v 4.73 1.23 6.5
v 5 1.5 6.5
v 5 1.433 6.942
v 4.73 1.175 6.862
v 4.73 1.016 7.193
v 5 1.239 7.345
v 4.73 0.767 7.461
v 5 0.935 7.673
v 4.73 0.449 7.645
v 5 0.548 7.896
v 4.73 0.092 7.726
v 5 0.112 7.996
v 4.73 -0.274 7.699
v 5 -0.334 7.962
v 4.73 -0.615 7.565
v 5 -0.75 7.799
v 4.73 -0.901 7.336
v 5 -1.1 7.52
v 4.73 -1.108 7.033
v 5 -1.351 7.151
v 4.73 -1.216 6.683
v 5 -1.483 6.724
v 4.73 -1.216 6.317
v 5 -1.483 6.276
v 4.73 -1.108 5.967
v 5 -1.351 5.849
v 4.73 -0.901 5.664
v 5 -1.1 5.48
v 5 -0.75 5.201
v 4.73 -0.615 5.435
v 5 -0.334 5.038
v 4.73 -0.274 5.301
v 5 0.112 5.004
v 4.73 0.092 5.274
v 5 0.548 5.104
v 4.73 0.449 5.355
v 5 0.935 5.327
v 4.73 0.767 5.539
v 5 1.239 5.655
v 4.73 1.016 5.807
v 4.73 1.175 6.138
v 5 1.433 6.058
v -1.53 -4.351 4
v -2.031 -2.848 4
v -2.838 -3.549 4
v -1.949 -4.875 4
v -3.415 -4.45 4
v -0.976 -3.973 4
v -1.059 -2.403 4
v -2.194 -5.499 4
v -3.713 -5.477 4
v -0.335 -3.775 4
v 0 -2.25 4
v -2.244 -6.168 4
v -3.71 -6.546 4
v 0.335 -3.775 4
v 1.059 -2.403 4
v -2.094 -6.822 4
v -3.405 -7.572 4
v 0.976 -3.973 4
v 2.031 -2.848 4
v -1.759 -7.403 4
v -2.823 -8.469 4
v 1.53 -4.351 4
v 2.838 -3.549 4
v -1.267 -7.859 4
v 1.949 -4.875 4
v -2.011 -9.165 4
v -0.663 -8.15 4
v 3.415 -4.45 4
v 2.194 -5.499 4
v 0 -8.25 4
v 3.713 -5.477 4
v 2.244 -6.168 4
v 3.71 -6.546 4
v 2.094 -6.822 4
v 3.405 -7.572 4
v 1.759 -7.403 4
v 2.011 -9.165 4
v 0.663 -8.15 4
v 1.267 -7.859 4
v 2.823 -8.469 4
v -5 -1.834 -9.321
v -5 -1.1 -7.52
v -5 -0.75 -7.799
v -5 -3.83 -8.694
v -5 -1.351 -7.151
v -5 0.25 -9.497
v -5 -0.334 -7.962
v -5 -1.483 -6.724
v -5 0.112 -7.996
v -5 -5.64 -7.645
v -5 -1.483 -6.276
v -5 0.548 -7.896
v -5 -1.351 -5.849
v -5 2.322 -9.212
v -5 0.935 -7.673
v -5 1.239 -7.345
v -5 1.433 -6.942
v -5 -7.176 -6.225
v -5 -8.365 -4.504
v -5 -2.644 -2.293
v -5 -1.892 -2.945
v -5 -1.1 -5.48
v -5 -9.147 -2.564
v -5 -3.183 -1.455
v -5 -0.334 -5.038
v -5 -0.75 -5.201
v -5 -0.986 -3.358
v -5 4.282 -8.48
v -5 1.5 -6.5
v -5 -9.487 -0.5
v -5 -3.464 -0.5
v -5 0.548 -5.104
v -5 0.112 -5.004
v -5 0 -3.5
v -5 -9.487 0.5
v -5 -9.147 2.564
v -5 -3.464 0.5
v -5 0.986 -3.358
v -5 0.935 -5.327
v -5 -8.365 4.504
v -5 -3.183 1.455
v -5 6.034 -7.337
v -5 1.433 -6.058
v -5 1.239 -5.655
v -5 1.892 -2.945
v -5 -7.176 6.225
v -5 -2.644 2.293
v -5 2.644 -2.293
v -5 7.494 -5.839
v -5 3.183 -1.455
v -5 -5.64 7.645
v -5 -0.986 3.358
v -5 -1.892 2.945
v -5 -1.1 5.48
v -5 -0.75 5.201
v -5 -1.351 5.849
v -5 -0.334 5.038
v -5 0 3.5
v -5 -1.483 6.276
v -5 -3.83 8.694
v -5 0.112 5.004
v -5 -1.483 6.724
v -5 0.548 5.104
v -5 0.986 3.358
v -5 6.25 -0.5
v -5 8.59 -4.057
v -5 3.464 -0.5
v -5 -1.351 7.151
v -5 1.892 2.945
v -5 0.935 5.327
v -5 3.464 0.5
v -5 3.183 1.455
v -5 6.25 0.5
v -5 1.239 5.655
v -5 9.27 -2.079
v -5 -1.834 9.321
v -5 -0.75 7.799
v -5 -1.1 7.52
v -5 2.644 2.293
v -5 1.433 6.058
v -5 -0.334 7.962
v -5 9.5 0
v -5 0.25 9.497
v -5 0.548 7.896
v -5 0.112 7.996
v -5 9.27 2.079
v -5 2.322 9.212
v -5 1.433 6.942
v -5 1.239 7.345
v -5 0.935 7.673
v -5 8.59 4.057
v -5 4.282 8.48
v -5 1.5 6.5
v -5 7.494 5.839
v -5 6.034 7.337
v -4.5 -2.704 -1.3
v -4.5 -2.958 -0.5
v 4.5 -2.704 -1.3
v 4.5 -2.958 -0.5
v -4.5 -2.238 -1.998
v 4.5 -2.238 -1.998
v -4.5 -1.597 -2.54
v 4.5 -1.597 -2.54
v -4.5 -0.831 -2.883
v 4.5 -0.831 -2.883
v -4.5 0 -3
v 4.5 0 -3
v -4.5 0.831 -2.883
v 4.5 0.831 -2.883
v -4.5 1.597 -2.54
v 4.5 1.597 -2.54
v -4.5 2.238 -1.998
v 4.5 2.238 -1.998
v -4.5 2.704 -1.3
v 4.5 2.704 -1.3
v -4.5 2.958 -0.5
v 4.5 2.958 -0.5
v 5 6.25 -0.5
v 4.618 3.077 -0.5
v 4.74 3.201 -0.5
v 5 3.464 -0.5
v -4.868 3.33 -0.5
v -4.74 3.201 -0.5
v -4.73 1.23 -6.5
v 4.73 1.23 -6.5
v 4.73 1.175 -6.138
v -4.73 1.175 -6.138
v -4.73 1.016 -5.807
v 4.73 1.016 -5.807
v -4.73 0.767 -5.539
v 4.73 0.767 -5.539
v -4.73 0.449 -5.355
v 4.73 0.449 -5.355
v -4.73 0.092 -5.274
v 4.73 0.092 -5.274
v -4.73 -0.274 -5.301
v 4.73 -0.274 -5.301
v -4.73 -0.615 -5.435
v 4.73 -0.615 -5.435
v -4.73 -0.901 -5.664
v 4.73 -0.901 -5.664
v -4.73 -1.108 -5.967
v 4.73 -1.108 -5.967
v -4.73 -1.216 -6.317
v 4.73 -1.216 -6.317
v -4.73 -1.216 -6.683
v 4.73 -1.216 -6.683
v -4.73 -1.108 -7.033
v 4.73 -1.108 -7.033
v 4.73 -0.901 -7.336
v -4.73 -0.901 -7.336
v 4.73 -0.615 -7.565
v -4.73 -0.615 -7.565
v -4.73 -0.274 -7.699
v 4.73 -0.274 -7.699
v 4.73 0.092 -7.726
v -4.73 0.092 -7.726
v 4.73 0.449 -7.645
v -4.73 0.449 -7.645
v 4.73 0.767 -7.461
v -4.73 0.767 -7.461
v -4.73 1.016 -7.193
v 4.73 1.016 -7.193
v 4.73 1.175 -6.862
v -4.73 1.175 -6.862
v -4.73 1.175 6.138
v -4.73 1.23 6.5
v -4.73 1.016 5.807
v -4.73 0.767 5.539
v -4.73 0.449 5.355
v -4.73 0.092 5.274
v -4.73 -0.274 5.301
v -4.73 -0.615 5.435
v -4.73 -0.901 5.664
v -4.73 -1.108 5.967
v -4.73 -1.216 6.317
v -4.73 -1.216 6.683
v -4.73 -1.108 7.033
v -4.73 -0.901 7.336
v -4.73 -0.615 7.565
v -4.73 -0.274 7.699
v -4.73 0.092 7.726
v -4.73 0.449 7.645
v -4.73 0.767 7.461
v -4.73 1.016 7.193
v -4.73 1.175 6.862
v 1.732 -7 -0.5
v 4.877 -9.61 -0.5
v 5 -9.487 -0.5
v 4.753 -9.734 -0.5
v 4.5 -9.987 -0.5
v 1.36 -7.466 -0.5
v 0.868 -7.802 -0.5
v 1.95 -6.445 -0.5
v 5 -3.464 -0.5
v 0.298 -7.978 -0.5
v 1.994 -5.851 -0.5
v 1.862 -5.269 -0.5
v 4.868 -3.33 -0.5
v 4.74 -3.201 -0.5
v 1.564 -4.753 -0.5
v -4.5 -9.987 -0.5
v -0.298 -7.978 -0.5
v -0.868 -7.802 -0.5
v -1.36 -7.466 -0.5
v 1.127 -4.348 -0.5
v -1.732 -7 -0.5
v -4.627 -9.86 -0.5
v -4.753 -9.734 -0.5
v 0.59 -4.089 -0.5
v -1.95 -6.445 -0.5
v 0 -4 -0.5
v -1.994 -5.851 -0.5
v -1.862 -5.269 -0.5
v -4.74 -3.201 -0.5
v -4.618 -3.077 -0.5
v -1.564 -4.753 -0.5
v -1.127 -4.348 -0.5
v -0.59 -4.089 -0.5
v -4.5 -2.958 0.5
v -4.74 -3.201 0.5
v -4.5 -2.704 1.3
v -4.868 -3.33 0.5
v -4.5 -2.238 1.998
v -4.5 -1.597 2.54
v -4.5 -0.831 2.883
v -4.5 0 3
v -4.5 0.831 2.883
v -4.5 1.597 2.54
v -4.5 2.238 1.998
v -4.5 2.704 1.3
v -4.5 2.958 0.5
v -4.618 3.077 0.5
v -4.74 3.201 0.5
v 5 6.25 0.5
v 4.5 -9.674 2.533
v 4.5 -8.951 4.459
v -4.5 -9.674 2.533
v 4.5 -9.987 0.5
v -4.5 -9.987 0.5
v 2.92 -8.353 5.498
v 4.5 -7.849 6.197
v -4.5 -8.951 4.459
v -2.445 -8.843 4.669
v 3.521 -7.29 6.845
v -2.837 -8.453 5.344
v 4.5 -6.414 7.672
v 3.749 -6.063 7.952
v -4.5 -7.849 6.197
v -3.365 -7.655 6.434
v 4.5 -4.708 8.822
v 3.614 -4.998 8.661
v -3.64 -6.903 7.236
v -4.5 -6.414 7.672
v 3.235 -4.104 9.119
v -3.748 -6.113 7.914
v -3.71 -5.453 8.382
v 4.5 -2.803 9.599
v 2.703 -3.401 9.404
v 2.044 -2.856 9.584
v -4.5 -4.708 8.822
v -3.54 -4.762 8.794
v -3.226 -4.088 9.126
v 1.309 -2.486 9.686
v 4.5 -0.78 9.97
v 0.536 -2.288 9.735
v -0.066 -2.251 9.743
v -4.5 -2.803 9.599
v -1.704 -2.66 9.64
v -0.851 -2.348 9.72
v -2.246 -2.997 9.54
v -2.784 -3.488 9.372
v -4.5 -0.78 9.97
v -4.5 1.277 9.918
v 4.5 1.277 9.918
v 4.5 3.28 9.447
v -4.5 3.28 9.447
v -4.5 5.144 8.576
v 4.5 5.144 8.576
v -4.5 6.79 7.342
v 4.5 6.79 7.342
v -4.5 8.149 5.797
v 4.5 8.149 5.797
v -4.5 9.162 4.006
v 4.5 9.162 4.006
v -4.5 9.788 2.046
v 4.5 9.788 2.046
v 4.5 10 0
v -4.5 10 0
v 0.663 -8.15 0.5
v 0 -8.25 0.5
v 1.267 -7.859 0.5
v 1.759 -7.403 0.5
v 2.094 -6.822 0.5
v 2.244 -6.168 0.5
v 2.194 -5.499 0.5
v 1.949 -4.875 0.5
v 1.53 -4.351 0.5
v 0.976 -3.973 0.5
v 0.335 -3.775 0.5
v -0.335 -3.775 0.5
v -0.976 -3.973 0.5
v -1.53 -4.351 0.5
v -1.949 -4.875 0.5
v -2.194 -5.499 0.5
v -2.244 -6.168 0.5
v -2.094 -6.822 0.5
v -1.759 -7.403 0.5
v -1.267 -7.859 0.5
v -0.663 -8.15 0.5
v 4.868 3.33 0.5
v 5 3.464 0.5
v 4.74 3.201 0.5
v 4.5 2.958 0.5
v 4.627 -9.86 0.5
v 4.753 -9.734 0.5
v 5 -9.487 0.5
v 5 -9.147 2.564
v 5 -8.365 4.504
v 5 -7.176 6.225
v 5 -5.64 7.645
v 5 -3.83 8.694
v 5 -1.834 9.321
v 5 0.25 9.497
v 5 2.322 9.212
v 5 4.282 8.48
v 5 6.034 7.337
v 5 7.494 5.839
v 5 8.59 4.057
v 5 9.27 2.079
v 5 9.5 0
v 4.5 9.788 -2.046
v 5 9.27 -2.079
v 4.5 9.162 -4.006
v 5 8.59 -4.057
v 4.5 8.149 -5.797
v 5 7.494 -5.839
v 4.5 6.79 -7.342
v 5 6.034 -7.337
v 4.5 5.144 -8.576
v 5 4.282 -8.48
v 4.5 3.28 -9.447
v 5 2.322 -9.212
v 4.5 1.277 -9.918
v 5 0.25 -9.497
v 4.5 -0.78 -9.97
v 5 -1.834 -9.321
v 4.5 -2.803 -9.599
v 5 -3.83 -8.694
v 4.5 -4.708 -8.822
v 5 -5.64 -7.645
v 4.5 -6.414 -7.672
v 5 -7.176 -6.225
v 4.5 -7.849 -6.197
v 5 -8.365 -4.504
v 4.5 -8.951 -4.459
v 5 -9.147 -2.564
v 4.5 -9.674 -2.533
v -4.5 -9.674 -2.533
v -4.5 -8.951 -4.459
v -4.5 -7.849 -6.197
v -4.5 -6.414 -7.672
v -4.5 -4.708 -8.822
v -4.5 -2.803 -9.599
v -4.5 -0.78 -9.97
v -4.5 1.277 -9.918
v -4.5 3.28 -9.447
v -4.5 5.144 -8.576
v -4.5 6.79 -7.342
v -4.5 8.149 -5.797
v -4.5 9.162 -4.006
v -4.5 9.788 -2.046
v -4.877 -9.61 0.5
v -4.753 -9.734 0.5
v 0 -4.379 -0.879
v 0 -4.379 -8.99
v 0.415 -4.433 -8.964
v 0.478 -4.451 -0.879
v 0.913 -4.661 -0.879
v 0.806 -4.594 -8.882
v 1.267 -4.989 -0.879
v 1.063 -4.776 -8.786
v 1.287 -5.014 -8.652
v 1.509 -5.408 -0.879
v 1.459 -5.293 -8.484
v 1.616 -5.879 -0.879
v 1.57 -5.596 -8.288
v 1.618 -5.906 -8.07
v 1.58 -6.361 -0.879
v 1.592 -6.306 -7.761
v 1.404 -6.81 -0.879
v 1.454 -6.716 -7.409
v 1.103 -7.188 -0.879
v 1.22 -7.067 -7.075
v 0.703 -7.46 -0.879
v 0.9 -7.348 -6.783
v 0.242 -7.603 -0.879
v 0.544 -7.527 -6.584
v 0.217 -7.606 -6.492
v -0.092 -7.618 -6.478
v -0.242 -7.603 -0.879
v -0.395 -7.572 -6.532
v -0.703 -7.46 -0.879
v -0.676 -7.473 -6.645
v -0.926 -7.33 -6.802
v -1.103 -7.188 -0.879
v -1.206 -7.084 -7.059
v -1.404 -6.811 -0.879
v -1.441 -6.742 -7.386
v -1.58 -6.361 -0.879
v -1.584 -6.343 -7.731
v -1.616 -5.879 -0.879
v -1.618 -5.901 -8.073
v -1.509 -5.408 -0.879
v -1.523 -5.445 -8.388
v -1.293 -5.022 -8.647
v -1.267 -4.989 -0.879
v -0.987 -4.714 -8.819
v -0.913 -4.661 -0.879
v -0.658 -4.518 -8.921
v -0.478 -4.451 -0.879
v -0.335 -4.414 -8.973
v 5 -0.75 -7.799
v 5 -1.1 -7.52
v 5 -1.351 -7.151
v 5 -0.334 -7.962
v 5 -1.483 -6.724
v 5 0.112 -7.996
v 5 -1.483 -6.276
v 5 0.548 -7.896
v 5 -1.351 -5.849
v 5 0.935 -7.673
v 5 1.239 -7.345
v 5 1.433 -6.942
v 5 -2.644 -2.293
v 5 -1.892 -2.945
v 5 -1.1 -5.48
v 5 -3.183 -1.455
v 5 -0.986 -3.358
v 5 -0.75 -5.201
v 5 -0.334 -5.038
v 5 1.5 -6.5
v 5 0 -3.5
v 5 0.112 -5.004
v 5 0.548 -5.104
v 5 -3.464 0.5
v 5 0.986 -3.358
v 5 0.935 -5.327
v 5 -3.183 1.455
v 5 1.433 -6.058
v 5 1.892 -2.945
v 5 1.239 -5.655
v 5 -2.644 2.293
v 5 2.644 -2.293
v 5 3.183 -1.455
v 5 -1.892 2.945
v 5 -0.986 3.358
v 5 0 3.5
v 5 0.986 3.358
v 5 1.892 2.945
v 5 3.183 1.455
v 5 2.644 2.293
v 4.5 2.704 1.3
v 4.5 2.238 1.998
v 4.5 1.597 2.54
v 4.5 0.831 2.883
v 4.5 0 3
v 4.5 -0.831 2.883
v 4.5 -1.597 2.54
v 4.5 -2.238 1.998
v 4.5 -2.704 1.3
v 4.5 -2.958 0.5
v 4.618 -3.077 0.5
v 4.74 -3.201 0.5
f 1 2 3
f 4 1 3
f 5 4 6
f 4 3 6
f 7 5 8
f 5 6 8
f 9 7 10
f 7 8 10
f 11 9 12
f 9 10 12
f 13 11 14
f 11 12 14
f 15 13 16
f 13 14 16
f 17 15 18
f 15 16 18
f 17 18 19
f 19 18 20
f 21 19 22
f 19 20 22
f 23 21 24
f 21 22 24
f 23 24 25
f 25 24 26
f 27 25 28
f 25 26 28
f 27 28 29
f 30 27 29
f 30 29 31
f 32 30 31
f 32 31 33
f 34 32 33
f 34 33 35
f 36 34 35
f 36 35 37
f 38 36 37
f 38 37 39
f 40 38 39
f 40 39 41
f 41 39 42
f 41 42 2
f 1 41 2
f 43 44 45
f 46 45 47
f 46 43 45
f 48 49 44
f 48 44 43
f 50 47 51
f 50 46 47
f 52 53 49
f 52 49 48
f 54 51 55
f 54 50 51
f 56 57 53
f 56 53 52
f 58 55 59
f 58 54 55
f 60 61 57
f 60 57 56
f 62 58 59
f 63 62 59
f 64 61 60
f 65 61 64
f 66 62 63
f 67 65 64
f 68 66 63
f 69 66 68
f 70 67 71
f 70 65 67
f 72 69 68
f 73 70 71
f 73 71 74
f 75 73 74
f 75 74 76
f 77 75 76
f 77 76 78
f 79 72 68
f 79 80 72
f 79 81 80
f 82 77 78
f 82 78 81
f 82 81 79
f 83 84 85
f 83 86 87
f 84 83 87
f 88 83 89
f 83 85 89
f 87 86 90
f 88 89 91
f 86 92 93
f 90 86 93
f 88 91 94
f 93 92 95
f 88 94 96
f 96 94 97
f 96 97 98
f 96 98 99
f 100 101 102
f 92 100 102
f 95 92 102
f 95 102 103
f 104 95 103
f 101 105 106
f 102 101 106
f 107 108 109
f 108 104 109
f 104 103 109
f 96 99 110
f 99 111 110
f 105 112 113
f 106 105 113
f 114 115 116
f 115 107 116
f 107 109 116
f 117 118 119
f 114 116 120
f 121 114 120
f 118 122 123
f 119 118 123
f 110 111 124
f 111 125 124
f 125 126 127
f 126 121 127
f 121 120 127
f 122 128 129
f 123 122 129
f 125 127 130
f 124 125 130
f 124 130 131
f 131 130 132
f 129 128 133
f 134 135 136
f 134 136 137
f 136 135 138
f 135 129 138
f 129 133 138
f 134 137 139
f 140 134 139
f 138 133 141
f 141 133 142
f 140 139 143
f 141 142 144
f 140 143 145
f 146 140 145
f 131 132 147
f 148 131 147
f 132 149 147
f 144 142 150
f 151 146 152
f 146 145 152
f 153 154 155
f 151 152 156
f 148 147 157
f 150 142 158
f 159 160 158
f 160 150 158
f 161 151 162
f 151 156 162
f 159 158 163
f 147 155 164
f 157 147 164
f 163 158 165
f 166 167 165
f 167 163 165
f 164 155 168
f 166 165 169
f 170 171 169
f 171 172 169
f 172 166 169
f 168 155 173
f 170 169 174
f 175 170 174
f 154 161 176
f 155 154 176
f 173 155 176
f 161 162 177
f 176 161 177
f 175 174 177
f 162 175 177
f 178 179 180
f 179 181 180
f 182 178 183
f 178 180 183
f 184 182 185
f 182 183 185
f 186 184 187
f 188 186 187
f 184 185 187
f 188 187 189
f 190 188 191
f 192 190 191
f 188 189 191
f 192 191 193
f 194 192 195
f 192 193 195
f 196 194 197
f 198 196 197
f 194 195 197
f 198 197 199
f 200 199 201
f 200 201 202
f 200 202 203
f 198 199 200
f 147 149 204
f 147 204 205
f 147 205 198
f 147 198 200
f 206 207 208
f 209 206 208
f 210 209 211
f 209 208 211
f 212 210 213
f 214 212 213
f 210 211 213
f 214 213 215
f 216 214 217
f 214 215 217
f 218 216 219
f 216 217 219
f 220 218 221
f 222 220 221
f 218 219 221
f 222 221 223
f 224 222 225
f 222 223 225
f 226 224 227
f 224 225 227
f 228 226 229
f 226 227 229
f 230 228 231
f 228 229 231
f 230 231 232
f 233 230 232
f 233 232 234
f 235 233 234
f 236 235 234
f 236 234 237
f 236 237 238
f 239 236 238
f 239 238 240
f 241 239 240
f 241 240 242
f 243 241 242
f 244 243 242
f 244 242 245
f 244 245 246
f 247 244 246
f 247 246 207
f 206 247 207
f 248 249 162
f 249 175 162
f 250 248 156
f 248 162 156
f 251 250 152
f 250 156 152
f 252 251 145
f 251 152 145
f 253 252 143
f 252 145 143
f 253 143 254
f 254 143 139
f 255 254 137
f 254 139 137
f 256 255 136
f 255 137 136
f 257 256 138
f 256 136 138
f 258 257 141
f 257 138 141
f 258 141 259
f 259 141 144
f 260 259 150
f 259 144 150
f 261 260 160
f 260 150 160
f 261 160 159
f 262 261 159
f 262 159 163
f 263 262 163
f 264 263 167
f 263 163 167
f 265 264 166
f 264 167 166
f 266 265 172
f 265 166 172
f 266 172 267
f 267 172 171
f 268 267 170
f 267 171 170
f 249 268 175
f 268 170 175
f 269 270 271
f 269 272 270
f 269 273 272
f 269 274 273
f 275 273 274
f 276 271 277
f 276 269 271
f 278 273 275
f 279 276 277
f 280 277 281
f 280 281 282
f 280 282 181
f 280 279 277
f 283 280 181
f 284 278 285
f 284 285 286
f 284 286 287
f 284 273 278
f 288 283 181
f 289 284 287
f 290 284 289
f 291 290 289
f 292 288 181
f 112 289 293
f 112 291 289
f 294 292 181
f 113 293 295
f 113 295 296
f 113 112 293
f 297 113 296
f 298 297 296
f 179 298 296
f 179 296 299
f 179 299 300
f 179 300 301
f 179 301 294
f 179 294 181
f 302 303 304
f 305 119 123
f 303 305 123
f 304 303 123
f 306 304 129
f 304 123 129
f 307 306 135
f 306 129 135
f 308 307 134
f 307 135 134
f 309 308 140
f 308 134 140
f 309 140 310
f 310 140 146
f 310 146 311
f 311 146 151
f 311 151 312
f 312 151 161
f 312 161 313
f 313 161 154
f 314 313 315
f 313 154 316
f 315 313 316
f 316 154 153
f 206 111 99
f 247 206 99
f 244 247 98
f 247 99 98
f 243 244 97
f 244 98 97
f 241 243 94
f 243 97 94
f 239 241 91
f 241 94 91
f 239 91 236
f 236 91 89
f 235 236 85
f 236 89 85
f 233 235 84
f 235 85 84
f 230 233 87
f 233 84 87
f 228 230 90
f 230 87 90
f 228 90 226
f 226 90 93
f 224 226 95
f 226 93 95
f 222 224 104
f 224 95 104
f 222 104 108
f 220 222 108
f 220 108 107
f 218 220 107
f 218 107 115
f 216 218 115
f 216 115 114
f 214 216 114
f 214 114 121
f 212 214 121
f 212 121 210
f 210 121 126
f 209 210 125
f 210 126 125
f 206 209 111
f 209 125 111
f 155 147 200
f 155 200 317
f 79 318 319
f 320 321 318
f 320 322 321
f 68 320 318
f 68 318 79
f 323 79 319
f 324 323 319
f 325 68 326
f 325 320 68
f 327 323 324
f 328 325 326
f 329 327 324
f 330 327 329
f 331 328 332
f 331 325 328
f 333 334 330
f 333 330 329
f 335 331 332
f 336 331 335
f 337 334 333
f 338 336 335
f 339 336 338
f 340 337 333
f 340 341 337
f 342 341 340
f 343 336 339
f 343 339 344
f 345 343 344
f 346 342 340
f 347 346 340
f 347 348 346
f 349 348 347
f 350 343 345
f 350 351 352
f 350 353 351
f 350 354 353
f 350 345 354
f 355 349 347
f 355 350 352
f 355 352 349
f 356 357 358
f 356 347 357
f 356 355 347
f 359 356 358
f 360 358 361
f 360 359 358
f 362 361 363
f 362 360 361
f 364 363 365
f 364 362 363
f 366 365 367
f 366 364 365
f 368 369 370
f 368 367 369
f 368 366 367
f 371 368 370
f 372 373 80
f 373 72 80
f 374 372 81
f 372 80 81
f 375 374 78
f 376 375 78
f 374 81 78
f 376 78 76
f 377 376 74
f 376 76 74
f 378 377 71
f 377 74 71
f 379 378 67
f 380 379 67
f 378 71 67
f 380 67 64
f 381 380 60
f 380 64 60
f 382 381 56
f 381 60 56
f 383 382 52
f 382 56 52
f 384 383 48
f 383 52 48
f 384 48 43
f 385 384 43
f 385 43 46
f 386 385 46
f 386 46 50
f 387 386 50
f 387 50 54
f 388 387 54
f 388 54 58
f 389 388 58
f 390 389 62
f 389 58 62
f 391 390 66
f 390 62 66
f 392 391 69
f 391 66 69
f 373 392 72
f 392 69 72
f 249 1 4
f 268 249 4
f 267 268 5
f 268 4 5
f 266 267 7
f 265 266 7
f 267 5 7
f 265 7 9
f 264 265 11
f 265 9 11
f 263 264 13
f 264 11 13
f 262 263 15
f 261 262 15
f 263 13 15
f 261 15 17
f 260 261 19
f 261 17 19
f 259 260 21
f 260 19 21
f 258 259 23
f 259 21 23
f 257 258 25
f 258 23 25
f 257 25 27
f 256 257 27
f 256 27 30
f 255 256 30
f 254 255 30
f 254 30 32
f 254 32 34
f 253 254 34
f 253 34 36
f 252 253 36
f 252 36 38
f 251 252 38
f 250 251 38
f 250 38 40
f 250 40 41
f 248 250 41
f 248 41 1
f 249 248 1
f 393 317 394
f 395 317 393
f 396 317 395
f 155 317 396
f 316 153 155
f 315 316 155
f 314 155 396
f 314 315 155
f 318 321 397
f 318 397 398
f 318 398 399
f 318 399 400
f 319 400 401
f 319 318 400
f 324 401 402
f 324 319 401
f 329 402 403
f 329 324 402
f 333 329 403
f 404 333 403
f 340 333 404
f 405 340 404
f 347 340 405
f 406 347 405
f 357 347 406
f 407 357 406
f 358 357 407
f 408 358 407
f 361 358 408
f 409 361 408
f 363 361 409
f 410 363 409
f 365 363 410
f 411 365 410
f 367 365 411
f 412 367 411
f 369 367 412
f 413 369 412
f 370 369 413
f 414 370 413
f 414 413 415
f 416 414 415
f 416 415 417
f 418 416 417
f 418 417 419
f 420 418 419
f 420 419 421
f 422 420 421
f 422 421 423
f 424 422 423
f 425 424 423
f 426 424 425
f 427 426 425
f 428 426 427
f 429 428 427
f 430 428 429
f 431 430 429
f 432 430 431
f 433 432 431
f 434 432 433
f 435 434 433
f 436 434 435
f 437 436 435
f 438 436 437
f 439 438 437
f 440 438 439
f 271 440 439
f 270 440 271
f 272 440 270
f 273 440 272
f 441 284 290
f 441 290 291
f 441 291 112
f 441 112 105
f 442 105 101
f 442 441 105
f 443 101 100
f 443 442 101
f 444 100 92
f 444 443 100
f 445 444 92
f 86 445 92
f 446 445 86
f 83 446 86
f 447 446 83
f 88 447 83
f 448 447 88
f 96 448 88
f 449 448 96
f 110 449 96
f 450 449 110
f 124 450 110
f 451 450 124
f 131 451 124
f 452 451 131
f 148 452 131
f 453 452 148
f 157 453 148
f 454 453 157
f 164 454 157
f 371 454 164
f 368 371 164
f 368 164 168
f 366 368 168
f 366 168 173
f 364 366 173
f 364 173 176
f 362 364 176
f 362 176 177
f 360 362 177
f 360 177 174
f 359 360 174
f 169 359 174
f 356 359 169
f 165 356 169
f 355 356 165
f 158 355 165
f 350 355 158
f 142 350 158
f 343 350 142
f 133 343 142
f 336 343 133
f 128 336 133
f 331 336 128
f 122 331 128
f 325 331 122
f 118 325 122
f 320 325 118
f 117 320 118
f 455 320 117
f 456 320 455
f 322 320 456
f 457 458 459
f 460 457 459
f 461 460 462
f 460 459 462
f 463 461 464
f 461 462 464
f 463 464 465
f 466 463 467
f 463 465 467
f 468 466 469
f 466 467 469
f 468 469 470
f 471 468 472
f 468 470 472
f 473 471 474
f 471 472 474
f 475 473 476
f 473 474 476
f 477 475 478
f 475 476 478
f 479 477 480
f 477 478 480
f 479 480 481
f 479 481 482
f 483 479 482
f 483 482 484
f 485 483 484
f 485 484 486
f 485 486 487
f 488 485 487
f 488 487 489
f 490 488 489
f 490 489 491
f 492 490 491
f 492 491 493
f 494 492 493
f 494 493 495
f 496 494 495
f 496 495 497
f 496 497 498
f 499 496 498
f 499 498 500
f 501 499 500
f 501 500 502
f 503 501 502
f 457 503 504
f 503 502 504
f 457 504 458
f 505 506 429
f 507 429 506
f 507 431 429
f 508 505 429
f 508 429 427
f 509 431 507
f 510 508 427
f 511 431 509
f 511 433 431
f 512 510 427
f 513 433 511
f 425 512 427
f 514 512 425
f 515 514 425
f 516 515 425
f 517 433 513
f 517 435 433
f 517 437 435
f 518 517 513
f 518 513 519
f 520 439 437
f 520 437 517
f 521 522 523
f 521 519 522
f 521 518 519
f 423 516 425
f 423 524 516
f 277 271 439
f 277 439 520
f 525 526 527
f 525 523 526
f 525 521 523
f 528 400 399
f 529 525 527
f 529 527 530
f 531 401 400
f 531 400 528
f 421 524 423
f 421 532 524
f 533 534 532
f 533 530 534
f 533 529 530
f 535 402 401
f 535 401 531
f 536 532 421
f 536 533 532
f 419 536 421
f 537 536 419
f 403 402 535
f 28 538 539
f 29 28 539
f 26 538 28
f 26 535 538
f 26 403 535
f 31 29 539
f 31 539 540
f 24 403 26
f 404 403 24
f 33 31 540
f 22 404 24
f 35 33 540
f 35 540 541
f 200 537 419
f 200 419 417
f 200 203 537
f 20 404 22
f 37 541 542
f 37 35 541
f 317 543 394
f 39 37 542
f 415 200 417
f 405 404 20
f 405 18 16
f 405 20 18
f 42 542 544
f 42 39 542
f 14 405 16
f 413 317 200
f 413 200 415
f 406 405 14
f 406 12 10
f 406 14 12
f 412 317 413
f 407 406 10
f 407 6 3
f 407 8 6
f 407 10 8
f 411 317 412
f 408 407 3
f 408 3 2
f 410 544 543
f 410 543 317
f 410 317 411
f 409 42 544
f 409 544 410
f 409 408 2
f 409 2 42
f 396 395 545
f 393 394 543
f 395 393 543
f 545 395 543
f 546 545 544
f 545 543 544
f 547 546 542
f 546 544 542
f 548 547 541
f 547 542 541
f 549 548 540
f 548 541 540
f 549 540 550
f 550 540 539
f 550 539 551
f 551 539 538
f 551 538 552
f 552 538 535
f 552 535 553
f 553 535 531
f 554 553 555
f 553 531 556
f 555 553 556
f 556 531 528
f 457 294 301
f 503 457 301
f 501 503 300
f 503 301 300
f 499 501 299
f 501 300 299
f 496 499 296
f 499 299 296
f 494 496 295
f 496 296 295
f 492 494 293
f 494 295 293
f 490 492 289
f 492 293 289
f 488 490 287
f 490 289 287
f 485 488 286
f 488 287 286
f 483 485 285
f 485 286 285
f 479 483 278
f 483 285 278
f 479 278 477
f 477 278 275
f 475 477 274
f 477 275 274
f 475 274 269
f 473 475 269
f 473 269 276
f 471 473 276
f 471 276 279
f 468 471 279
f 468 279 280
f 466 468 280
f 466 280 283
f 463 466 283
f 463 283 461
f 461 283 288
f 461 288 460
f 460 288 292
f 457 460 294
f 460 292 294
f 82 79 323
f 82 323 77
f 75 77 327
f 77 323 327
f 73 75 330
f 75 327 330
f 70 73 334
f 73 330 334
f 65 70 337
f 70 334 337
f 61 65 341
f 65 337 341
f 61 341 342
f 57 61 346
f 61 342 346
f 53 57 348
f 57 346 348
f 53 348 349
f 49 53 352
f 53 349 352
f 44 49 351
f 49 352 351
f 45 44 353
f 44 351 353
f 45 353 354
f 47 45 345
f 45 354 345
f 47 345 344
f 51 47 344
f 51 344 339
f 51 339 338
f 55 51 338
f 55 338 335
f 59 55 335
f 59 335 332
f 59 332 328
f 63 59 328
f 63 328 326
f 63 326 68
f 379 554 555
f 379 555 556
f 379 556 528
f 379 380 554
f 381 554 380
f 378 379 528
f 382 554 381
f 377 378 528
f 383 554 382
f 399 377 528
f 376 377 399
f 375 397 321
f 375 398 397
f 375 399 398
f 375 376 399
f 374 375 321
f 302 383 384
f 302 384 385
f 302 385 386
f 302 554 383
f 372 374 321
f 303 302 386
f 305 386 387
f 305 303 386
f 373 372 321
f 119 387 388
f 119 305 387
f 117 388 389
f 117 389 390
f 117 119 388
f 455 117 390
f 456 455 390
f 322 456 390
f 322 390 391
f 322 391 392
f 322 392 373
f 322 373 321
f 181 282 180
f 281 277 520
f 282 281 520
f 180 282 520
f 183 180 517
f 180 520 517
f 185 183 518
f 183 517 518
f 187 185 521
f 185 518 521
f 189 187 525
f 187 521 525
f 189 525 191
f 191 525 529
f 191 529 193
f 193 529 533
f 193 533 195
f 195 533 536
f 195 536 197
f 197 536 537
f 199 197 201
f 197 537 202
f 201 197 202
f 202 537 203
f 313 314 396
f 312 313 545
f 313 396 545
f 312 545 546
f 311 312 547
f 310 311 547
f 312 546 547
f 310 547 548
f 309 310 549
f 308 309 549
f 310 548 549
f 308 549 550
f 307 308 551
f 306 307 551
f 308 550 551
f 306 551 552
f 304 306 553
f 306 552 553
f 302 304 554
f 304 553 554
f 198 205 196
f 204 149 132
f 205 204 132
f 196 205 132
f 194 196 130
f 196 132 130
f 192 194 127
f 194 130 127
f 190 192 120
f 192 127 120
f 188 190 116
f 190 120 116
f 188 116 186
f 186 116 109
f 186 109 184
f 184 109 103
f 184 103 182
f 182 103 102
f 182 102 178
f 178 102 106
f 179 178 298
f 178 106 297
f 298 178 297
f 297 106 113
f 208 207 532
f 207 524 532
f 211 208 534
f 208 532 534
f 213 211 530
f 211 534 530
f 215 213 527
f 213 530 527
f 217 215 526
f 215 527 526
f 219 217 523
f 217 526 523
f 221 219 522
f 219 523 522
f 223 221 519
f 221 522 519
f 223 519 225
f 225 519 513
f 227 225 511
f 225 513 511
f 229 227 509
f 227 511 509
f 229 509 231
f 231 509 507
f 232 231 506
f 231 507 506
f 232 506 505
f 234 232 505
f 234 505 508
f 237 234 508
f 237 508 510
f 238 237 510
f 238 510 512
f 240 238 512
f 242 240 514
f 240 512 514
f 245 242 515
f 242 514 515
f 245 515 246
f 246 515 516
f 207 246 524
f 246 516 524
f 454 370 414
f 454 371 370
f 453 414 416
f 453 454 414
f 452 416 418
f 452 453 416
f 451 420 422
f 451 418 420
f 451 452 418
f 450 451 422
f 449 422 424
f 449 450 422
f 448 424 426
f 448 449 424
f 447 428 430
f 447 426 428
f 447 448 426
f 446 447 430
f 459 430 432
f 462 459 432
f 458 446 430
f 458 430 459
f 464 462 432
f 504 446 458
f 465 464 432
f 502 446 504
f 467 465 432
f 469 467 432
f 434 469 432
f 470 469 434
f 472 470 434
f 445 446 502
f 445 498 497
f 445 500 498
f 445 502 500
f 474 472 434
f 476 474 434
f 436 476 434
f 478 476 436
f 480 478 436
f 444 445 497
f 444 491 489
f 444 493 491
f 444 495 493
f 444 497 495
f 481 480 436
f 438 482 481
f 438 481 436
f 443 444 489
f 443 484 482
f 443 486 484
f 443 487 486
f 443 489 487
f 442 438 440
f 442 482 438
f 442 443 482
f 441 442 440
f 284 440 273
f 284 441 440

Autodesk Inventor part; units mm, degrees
sketch "Sketch_1" plane through (0, 0, 0) normal (0, 0, 1) x (1, 0, 0)
  line L0 (5, 0) -> (-5, 0)
  line L1 (-5, 9.5) -> (-5, 3.5)
  line L2 (-5, 3.5) -> (-4.5, 3)
  line L3 (-4.5, 3) -> (4.5, 3)
  line L4 (4.5, 3) -> (5, 3.5)
  line L5 (5, 3.5) -> (5, 9.5)
  line L6 (5, 9.5) -> (4.5, 10)
  line L7 (4.5, 10) -> (-4.5, 10)
  line L8 (-4.5, 10) -> (-5, 9.5)
revolve "Revolution1" add sketch "Sketch_1" angle 360 about axis through (5, 0, 0) along (1, 0, 0)
sketch "Sketch_2" plane through (0, 0, 0) normal (1, 0, 0) x (0, 1, 0)
  line L0 (-10, 0.5) -> (-10, -0.5)
  line L1 (-10, -0.5) -> (6.25, -0.5)
  line L2 (6.25, -0.5) -> (6.25, 0.5)
  line L3 (6.25, 0.5) -> (-10, 0.5)
extrude "Extrusion1" cut sketch "Sketch_2" along normal mid plane 10
sketch "Sketch_3" plane through (0, 0, 0) normal (1, 0, 0) x (0, 1, 0)
  line L0 (-6, 10) -> (-6, 0)
  line L1 (-6, 0) -> (-8.25, 0)
  line L2 (-8.25, 0) -> (-8.25, 4)
  line L3 (-8.25, 4) -> (-9.75, 4)
  line L4 (-9.75, 4) -> (-9.75, 10)
  line L5 (-9.75, 10) -> (-6, 10)
  line L6 (-6, 10) -> (-6, 0)
revolve "Revolution2" cut sketch "Sketch_3" angle 360 about axis through (0, -6, 10) along (0, 0, 1)
sketch "Sketch_4" plane through (0, 0, 0) normal (1, 0, 0) x (0, 1, 0)
  line L0 (-6, -9.5) -> (-6, -0.5)
  line L1 (-6, -0.5) -> (-4, -0.5)
  line L2 (-4, -0.5) -> (-4.379, -0.879)
  line L3 (-4.379, -0.879) -> (-4.379, -9.5)
  line L4 (-4.379, -9.5) -> (-6, -9.5)
  line L5 (-6, -9.5) -> (-6, -0.5)
revolve "Revolution3" cut sketch "Sketch_4" angle 360 about axis through (0, -6, -9.5) along (0, 0, -1)
thread "Thread1" size "M4x0.7" class "6H" standard "ISO Metric profile" length 8.2861
sketch "Sketch_7" plane through (0, 0, -6.5) normal (0, 0, 1) x (1, 0, 0)
  line L0 (5, 0) -> (-5, 0)
  line L1 (-5, 0) -> (-5, 1.5)
  line L2 (-5, 1.5) -> (-4.7295, 1.2295)
  line L3 (-4.7295, 1.2295) -> (4.7295, 1.2295)
  line L4 (4.7295, 1.2295) -> (5, 1.5)
  line L5 (5, 1.5) -> (5, 0)
  line L6 (5, 0) -> (-5, 0)
revolve "Revolution4" cut sketch "Sketch_7" angle 360 about axis through (5, 0, -6.5) along (1, 0, 0)
thread "Thread2" size "M3x0.5" class "6H" standard "ISO Metric profile" full length
sketch "Sketch_8" plane through (0, 0, 6.5) normal (0, 0, 1) x (1, 0, 0)
  line L0 (5, 0) -> (-5, 0)
  line L1 (-5, 0) -> (-5, 1.5)
  line L2 (-5, 1.5) -> (-4.7295, 1.2295)
  line L3 (-4.7295, 1.2295) -> (4.7295, 1.2295)
  line L4 (4.7295, 1.2295) -> (5, 1.5)
  line L5 (5, 1.5) -> (5, 0)
  line L6 (5, 0) -> (-5, 0)
revolve "Revolution5" cut sketch "Sketch_8" angle 360 about axis through (5, 0, 6.5) along (1, 0, 0)
thread "Thread3" size "M3x0.5" class "6H" standard "ISO Metric profile" full length
ref_plane "body_screw_XY" through (0, -6, 4) normal (0, 0, 1) x (1, 0, 0)
ref_plane "body_screw_YZ" through (0, -6, 4) normal (1, 0, 0) x (0, 1, 0)
ref_plane "body_screw_ZX" through (0, -6, 4) normal (0, 1, 0) x (0, 0, 1)
properties part number "SCSW6-10b"
